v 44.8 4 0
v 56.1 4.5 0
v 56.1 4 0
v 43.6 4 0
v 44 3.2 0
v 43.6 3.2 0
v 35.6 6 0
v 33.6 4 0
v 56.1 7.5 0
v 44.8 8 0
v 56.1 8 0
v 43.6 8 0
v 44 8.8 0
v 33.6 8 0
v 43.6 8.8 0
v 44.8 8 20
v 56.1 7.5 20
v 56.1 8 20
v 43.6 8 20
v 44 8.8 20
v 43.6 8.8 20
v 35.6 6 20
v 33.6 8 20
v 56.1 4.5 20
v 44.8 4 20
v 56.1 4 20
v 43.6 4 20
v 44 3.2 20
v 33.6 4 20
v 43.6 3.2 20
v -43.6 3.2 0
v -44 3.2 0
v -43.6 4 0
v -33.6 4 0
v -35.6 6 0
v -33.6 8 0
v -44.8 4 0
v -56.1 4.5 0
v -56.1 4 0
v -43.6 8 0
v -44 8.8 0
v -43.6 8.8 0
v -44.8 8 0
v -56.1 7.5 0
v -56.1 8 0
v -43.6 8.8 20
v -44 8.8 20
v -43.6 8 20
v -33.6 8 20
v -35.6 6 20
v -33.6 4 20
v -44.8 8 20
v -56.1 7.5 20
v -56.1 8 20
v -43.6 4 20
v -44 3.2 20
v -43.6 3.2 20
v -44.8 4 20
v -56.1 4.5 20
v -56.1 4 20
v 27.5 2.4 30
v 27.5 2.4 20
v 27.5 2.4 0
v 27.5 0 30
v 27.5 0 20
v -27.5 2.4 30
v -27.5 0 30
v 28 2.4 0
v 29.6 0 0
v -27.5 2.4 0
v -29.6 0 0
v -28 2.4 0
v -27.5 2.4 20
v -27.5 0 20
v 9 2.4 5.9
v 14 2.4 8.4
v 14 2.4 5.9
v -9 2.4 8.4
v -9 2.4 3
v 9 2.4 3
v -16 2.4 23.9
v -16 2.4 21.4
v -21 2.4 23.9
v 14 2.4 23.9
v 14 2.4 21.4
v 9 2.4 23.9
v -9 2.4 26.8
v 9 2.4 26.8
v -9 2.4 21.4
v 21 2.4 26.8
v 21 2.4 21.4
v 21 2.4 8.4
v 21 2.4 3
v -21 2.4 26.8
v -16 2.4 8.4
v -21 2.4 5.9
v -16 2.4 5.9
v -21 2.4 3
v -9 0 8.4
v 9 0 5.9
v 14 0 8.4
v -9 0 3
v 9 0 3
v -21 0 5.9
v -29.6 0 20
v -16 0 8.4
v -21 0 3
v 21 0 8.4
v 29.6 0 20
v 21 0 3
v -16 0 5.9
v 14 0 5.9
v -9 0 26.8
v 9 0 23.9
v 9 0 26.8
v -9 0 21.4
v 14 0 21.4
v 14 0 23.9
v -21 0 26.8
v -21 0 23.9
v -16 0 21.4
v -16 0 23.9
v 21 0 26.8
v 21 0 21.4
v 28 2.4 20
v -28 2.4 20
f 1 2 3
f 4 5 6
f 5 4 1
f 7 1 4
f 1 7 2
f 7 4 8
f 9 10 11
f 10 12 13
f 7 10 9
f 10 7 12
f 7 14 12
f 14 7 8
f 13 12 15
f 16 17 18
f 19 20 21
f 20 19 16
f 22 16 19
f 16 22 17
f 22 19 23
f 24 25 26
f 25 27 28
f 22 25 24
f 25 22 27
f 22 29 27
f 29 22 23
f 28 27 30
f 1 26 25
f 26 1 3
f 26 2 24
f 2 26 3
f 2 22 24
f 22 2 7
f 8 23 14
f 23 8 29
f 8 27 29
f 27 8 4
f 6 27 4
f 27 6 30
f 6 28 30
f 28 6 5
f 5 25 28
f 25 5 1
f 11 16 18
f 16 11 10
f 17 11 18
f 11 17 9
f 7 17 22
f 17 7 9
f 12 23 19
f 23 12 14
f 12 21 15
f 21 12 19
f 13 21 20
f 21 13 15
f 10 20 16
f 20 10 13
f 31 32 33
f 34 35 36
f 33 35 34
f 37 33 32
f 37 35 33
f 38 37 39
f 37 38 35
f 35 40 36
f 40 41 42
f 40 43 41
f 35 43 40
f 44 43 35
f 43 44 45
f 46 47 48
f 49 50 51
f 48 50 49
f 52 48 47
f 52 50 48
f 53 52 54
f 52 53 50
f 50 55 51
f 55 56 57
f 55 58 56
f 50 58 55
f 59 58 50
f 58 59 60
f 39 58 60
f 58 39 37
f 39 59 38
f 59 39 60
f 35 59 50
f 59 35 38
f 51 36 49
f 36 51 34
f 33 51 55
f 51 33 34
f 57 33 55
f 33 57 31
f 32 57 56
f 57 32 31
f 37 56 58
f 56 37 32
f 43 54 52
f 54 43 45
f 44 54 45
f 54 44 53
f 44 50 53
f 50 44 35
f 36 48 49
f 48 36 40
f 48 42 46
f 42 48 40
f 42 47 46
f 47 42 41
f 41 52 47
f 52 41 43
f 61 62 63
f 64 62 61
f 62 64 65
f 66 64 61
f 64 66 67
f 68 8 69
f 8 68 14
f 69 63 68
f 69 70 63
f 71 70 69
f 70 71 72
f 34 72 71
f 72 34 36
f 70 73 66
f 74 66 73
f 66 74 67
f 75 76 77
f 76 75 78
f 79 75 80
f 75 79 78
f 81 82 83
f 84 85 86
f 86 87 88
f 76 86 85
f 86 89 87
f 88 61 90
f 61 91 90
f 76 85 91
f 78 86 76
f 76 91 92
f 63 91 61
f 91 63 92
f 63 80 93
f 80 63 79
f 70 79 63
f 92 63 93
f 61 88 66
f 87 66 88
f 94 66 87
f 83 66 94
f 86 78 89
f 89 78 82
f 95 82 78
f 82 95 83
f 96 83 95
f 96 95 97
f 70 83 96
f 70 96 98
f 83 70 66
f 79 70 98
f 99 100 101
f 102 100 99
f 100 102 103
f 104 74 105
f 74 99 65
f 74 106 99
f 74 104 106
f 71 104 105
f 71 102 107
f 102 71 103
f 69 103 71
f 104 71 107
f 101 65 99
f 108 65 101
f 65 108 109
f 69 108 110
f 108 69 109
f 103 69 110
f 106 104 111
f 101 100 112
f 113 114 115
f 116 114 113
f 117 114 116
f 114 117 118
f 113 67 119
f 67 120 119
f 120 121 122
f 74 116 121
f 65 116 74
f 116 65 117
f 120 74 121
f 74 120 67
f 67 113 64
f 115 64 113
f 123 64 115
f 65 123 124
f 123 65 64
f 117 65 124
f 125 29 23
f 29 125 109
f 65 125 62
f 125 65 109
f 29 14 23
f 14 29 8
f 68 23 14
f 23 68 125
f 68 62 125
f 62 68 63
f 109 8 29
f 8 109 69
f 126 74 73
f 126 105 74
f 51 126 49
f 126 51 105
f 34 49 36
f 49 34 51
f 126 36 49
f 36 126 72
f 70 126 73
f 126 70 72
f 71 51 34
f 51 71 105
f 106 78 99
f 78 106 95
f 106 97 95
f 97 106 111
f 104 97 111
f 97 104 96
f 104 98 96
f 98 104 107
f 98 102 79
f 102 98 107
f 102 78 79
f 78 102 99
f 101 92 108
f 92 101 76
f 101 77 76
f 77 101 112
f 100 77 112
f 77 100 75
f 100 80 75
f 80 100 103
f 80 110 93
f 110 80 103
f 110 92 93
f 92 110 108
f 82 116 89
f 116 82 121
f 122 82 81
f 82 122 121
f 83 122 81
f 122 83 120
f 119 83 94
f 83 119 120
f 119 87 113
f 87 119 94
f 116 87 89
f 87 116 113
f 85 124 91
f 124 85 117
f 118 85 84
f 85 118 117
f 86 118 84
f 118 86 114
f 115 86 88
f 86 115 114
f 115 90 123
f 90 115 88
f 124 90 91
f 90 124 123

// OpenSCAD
// [FL_INDEX: keywords="openscad, 3d_parametric, Universal_Device_Mount__Bar, csg_solid" | COT="Parametric OpenSCAD design from 3DCodeverse"]
// Title: Universal Device Mount: Bar

// Generate universal plate or screw connector
connector="universal"; // [universal:Universal connector plate,screw:M6 hole connector]

// Width of device, measured from outside of fixation bracket to outside of second bracket
device_width=100;

/* [Hidden] */
// Development values for testing
//Xperia Active
device_width=87.2;


bar_height=20;
bar_width=4;
latch_space=10;
connector_depth=2.4;

module hook () {
  linear_extrude(height=bar_height)translate([0,-2,0])polygon(points=[[-latch_space,0],[0,0],[0,-0.8],[0.4,-0.8],[1.2,0],[12.5,0],[12.5, 0.5],[-latch_space+2,2],[-latch_space,bar_width/2]]);

}

module latch () {
  hook();
  mirror([0,1,0])hook();
};

module cutout () {
  translate([0,connector_depth,0])rotate([90,0,0])linear_extrude(height=connector_depth*2)polygon(points=[[0,0],[12,0],[12,5.4],[5,5.4],[5,2.9],[0,2.9]]);
}

module beam () {
  beam_length=device_width/2-latch_space;

  linear_extrude(height=bar_height)polygon(points=[[0,0],[beam_length-bar_width,0],[beam_length,bar_width],[beam_length,2*bar_width],[beam_length-(bar_width*2-connector_depth),connector_depth],[0,connector_depth]]);
}

// Universal connector plate. See www.dx.com for hundreds of gooseneck connectors.
module universal_connector () {
 difference() {
  union () {
    translate([-55/2,0,0])cube([55,connector_depth,30]);
    beam();
    mirror()beam();
  }
  translate([-21,0,3])union() {
    union() {
      cutout();
      translate([30,0,0])cutout();
    }
    translate([0,0,23.8])mirror([0,0,1]) {
      cutout();
      translate([30,0,0])cutout();
    }
  }
 }
}

module m6_connector () {
  beam();
  mirror()beam();

  difference() {
    hull() {
      translate([0,-18,0])cylinder(r=6,h=4, $fn=40);
      translate([0, -1.75, 2])cube([19.4, 3.5, 4], center=true);
    }
    translate([0,-18,-1])cylinder(r=3.5,h=6, $fn=40);
  }

  difference () {
    difference () {
      translate([0, -1.75, 2])cube([26.4, 3.5, 4], center=true);
      translate([14.5, -4.8, -1])cylinder(r=5, h=6, $fn=40);
    }
    translate([-14.5, -4.8, -1])cylinder(r=5, h=6, $fn=40);
  }
};

translate([device_width/2,bar_width*1.5,0])latch();
translate([-device_width/2,bar_width*1.5,0])mirror()latch();

if (connector=="universal") {
  universal_connector();
} else {
  m6_connector();
};
